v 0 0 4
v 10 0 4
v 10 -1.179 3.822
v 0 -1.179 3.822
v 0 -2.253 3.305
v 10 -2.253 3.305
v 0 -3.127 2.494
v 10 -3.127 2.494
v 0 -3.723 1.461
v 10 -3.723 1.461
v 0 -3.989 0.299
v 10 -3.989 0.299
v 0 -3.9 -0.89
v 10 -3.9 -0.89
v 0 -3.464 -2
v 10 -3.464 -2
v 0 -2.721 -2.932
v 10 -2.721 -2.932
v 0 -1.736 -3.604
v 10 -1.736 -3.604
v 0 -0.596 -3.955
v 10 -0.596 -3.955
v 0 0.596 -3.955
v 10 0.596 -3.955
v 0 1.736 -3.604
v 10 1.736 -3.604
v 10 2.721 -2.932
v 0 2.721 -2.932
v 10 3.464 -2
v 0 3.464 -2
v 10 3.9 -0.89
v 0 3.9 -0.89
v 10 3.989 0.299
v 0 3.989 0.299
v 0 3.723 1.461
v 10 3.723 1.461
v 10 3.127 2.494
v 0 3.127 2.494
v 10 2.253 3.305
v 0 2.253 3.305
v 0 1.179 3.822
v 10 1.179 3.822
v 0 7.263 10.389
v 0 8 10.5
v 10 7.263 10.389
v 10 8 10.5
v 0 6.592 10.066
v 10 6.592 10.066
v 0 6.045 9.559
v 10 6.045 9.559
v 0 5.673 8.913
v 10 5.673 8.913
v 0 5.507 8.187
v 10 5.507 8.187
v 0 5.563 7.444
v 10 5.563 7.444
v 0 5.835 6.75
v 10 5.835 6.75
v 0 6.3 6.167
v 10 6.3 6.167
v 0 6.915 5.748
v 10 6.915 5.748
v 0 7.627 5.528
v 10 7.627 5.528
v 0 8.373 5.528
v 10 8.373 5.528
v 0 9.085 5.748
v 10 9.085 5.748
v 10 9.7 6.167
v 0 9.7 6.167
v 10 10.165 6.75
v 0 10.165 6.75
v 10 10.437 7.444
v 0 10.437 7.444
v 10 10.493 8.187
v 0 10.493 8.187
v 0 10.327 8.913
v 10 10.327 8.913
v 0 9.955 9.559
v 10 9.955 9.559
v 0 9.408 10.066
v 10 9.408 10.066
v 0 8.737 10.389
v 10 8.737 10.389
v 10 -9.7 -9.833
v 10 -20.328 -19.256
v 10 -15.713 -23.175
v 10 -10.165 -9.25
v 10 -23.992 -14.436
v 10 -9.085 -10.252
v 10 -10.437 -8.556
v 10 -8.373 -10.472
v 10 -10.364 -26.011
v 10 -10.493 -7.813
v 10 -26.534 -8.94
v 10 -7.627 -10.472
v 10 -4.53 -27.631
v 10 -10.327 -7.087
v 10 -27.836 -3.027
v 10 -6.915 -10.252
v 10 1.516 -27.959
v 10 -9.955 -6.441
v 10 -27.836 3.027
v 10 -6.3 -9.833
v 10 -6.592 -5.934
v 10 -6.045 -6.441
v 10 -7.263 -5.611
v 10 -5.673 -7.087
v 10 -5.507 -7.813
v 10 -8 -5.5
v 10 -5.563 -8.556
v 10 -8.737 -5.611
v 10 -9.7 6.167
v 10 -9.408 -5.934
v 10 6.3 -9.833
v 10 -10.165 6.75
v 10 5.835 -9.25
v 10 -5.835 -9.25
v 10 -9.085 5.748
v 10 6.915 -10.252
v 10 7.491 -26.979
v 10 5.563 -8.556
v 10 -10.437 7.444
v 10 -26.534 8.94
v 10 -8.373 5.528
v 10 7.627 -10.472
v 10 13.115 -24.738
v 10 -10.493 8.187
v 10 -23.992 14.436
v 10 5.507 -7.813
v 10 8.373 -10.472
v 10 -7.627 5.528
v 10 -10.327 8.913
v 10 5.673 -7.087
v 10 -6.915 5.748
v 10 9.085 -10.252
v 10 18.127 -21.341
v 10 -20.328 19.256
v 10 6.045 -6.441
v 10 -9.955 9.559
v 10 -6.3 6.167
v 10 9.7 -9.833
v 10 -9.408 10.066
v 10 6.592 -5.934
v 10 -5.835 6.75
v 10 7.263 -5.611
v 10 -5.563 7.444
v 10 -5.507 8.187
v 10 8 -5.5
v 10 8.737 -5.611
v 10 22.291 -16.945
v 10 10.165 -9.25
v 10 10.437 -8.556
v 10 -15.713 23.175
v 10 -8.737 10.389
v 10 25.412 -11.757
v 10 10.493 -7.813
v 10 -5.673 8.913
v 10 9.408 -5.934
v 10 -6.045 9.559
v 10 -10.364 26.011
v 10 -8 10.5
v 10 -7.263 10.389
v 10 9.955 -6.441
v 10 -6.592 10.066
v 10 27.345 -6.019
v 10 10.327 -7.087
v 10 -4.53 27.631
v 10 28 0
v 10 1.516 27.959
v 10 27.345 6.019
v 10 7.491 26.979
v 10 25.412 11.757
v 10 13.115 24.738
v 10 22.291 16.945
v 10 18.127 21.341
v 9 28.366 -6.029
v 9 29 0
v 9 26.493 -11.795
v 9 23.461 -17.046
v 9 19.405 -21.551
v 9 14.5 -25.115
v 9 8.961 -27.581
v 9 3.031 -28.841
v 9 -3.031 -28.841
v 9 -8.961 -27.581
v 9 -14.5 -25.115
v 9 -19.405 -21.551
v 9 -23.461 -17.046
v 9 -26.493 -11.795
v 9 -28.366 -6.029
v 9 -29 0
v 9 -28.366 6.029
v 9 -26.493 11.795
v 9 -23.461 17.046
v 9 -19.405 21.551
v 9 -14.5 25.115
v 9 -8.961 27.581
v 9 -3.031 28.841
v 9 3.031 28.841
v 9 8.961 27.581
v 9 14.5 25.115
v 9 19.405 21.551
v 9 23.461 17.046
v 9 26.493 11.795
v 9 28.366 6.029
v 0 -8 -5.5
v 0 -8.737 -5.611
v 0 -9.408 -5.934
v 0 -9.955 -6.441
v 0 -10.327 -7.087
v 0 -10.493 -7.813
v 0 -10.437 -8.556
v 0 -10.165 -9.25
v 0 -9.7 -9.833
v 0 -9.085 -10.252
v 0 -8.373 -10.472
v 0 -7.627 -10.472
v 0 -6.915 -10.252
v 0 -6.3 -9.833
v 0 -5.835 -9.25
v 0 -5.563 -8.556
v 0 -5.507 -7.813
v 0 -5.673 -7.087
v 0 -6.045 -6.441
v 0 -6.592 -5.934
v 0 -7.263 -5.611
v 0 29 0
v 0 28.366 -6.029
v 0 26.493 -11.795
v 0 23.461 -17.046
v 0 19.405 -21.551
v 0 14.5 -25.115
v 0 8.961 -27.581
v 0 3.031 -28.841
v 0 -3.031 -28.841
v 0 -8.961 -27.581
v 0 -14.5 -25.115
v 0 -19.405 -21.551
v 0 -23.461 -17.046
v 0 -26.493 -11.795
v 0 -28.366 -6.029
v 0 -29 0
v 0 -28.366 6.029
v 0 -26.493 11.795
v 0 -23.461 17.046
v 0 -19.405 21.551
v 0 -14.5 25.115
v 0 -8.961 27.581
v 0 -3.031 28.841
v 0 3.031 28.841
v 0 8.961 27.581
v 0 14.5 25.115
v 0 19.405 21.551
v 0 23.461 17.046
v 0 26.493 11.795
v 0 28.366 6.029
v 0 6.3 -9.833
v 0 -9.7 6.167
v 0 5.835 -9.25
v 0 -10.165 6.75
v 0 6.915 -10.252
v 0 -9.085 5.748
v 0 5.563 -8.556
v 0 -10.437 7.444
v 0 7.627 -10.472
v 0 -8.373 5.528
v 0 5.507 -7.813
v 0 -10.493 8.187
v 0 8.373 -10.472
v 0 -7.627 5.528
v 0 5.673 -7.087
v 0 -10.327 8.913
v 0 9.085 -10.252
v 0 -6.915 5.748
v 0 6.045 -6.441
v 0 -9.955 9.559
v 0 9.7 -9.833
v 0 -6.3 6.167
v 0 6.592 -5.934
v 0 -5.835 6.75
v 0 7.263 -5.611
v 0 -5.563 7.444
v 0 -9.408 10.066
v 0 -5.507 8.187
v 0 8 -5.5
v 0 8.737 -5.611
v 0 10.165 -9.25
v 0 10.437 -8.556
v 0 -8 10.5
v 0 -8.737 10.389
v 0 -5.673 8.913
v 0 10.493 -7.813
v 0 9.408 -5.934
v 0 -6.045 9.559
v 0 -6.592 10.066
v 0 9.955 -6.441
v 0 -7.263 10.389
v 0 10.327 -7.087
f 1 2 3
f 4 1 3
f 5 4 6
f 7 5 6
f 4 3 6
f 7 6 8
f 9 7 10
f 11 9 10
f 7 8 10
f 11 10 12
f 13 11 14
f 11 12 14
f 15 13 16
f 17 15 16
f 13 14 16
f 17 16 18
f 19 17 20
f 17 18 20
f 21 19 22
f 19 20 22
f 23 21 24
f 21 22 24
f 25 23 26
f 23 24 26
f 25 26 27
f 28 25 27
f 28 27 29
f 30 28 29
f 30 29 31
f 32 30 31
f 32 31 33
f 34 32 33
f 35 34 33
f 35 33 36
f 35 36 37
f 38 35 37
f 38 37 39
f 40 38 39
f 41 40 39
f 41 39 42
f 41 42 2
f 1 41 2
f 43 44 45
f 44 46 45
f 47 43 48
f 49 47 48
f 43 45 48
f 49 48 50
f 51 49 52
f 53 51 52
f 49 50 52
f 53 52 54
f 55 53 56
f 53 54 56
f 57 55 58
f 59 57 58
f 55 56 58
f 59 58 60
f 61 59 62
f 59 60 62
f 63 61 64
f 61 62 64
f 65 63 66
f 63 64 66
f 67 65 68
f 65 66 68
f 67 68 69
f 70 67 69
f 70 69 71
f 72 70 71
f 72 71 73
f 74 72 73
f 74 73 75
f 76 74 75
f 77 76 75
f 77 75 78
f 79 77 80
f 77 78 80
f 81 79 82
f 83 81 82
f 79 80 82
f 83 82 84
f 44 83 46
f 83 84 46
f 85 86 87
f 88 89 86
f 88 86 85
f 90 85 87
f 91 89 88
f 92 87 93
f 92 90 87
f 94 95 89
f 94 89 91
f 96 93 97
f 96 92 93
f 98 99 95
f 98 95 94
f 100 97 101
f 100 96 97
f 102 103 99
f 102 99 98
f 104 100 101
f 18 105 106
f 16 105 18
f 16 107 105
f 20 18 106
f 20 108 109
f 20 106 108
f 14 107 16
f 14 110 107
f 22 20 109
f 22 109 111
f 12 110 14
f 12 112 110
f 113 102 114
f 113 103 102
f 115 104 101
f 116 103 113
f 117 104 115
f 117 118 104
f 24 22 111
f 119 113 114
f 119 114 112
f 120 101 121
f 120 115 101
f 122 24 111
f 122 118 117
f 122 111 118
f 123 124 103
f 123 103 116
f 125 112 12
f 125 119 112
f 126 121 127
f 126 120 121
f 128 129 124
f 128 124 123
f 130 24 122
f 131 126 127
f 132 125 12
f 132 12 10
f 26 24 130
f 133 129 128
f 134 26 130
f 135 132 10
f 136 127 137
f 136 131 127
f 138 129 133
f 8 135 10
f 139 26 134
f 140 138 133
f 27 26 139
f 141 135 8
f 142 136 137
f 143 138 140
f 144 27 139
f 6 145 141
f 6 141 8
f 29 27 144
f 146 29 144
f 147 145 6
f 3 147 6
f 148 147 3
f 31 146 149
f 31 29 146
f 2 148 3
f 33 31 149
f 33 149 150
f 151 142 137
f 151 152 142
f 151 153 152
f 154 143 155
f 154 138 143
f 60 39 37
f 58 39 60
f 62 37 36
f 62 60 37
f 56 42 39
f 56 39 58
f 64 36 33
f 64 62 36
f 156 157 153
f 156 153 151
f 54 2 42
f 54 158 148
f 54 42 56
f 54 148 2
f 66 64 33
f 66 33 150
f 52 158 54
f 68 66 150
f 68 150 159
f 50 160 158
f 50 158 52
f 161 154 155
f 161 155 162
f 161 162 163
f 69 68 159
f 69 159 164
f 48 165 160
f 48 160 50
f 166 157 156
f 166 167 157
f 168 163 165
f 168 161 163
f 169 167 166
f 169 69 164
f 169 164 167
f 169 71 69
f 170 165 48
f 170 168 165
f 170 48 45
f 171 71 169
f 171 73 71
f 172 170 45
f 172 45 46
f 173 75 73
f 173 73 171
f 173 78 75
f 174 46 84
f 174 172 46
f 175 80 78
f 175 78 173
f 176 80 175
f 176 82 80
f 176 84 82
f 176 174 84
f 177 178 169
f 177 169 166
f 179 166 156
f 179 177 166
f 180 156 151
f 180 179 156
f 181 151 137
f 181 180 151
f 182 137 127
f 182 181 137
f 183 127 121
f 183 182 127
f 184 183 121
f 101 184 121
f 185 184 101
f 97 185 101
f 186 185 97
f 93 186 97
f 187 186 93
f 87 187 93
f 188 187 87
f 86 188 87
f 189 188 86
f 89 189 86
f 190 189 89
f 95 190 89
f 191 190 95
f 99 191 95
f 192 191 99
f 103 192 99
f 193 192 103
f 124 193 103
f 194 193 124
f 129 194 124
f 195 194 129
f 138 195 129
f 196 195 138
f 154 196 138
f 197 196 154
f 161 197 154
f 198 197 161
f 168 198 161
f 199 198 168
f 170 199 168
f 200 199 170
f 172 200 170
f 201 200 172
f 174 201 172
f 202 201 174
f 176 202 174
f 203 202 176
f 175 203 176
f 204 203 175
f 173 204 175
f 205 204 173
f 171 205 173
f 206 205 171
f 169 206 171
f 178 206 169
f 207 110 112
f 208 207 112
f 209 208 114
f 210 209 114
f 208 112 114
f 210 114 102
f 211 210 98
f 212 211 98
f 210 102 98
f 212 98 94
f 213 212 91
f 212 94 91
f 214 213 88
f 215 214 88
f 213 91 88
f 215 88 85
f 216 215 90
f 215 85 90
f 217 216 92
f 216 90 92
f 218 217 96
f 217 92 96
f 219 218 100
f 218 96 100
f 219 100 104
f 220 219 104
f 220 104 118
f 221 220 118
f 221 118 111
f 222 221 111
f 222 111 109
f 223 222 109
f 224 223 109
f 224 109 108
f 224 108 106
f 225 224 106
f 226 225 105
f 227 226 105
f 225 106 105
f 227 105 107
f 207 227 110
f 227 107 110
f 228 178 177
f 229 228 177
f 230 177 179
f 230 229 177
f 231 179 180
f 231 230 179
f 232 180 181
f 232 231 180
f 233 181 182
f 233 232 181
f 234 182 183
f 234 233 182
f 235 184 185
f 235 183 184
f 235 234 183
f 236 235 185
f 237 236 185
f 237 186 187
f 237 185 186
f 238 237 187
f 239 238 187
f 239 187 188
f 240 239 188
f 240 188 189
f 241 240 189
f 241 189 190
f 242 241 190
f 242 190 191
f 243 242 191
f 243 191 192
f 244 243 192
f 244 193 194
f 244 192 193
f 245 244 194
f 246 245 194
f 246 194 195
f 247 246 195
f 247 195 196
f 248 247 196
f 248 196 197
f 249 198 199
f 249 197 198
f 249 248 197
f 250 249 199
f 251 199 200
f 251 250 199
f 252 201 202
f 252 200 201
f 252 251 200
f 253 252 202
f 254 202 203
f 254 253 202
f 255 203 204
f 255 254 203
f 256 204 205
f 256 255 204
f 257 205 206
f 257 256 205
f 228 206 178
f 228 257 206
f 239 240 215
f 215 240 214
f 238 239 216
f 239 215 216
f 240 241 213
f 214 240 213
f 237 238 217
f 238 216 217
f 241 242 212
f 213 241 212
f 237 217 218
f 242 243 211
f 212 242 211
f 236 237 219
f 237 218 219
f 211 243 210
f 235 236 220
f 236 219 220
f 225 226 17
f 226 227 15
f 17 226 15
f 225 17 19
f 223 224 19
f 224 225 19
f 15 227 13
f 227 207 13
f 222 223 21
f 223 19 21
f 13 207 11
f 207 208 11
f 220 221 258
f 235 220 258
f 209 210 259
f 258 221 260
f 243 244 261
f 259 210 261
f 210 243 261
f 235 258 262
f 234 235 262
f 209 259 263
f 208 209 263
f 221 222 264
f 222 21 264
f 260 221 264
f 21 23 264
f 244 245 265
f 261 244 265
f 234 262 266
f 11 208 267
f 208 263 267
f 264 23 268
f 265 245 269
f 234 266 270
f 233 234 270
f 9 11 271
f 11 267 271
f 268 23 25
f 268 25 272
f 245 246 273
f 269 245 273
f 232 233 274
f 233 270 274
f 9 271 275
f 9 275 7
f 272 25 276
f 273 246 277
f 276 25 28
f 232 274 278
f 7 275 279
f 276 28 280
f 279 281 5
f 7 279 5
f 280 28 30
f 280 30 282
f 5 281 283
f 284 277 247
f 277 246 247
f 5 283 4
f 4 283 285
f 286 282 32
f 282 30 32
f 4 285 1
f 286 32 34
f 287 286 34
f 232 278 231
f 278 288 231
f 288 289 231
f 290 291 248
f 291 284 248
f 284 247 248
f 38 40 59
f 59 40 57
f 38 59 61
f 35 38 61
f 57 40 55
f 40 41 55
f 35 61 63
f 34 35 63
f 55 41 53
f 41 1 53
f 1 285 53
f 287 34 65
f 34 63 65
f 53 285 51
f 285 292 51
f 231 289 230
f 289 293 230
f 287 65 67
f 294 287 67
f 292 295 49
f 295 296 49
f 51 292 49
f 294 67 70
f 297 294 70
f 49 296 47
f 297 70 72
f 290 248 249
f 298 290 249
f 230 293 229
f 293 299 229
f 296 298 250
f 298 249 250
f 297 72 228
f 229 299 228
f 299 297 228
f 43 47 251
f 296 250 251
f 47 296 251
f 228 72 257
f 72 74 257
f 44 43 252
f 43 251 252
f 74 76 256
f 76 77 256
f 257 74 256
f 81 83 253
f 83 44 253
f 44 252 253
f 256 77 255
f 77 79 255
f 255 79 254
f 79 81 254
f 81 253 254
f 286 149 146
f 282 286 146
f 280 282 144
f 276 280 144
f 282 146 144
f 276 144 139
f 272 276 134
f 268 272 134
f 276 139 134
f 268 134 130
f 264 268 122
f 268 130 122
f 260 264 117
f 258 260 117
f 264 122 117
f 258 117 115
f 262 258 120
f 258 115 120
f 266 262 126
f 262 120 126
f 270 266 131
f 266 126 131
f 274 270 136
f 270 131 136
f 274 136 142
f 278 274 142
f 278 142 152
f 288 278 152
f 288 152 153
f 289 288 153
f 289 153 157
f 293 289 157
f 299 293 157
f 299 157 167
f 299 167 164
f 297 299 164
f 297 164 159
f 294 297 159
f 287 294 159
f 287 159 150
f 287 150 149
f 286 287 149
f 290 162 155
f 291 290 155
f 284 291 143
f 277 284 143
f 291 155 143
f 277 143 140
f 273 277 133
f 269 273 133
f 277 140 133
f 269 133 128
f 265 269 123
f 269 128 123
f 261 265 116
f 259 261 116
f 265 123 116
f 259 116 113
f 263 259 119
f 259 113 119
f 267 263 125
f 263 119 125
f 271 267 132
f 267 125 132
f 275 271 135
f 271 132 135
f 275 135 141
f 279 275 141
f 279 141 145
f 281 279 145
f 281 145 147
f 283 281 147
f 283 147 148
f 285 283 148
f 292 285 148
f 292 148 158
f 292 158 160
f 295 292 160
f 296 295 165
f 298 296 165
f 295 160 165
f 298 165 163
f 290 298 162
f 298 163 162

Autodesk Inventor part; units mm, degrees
ref_plane "YZ Plane" through (0, 0, 0) normal (1, 0, 0) x (0, 1, 0)
ref_plane "XZ Plane" through (0, 0, 0) normal (0, 1, 0) x (-1, 0, 0)
ref_plane "XY Plane" through (0, 0, 0) normal (0, 0, 1) x (1, 0, 0)
sketch "Sketch1" plane through (0, 0, 0) normal (1, 0, 0) x (0, 1, 0)
  circle A0 centre (0, 0) radius 29
  circle A1 centre (0, 0) radius 22.2155 construction
  circle A2 centre (0, 0) radius 29 projected
  dimension "d21" = 58
  dimension "d28" = 58
extrude "Extrusion1" add sketch "Sketch1" along normal blind 10
sketch "Sketch2" plane through (0, 0, 0) normal (-1, 0, 0) x (0, 0, 1)
  point P0 (0, 0)
  point P1 (8, 8)
  point P2 (8, -8)
  point P3 (-8, -8)
  point P4 (-8, 8)
  dimension "d2" = 8
  dimension "d3" = 8
  dimension "d4" = 16
  dimension "d5" = 16
hole "Hole1" at (0, 8, 8) at (0, -8, 8) at (0, -8, -8) at (0, 8, -8) direction (1, 0, 0) diameter 5 end through all
sketch "Sketch3" plane through (0, 0, 0) normal (-1, 0, 0) x (0, 0, 1)
  point P0 (0, 0)
  point P1 (0, 0)
hole "Hole2" at (0, 0, 0) direction (1, 0, 0) diameter 8 end through all
chamfer "Chamfer2" distance 1 distance2 1 1 edges at (10, -29, 0) measured on face at (10, -16.3716, 0)
equation "\"d21\" = d28"
equation "\"d4\" = 2 * d2"
equation "\"d5\" = d4"
properties part number "Tapon 2"
